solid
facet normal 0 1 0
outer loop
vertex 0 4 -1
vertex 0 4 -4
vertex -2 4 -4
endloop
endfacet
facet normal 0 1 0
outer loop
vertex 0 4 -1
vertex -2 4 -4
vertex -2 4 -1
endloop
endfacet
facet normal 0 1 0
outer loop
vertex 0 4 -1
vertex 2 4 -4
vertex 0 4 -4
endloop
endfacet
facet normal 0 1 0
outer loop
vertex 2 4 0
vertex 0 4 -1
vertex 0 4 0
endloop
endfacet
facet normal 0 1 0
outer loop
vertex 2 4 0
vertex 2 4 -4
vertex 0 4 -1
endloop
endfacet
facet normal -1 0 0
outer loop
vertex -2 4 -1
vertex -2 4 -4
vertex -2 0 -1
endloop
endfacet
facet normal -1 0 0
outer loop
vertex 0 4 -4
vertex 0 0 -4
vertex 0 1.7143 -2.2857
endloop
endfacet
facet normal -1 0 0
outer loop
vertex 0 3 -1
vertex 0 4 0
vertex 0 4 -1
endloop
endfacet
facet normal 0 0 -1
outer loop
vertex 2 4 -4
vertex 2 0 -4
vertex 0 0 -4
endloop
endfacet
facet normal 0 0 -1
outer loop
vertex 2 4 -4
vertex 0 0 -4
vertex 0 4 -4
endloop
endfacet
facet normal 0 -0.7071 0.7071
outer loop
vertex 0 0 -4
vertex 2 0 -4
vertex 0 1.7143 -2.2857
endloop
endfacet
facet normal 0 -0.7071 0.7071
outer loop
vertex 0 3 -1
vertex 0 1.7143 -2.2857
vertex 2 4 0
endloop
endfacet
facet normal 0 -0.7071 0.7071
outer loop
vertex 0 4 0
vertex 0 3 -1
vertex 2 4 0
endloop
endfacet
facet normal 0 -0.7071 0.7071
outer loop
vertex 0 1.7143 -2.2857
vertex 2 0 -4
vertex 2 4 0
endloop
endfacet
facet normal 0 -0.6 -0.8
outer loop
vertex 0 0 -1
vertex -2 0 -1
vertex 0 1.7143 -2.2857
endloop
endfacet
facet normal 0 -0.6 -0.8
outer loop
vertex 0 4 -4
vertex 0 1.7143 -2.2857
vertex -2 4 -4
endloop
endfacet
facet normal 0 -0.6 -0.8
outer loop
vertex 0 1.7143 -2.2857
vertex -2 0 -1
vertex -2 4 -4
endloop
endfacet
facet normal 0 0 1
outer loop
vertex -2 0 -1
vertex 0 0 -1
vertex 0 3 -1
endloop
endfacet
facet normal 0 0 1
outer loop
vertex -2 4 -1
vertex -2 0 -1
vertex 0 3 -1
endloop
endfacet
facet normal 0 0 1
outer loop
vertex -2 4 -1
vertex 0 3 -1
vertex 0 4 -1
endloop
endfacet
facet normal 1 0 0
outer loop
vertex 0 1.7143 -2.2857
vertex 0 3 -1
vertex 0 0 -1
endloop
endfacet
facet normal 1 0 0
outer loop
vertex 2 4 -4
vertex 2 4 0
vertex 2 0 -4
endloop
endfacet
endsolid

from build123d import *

# Parameters (mm, degrees)
SKETCH1_W           = 4
SKETCH1_H           = 4
BOSS_EXTRUDE1_DEPTH = 2
SKETCH2_W           = 3
SKETCH2_H           = 4
BOSS_EXTRUDE2_DEPTH = 2
CUT_EXTRUDE1_DEPTH  = 2
CUT_EXTRUDE2_DEPTH  = 2


with BuildPart() as part:
    # Sketch1 → Boss-Extrude1 (new body)
    with BuildSketch(Plane(origin=(0, 0, 0), x_dir=(0, 0, -1), z_dir=(1, 0, 0))):
        with Locations((2, 2)):
            Rectangle(SKETCH1_W, SKETCH1_H)
    extrude(amount=BOSS_EXTRUDE1_DEPTH)

    # Sketch2 → Boss-Extrude2 (add)
    with BuildSketch(Plane.ZY):
        with Locations((-2.5, 2)):
            Rectangle(SKETCH2_W, SKETCH2_H)
    extrude(amount=BOSS_EXTRUDE2_DEPTH)

    # Sketch3 → Cut-Extrude1 (cut)
    with BuildSketch(Plane(origin=(2, 0, 0), x_dir=(0, 0, -1), z_dir=(1, 0, 0))):
        Polygon((4, 0), (0, 4), (0, 0), align=None)
    extrude(amount=-CUT_EXTRUDE1_DEPTH, mode=Mode.SUBTRACT)

    # Sketch4 → Cut-Extrude2 (cut)
    with BuildSketch(Plane.ZY.offset(2)):
        Polygon((-1, 0), (-4, 4), (-4, 0), align=None)
    extrude(amount=-CUT_EXTRUDE2_DEPTH, mode=Mode.SUBTRACT)


solid = part.part
